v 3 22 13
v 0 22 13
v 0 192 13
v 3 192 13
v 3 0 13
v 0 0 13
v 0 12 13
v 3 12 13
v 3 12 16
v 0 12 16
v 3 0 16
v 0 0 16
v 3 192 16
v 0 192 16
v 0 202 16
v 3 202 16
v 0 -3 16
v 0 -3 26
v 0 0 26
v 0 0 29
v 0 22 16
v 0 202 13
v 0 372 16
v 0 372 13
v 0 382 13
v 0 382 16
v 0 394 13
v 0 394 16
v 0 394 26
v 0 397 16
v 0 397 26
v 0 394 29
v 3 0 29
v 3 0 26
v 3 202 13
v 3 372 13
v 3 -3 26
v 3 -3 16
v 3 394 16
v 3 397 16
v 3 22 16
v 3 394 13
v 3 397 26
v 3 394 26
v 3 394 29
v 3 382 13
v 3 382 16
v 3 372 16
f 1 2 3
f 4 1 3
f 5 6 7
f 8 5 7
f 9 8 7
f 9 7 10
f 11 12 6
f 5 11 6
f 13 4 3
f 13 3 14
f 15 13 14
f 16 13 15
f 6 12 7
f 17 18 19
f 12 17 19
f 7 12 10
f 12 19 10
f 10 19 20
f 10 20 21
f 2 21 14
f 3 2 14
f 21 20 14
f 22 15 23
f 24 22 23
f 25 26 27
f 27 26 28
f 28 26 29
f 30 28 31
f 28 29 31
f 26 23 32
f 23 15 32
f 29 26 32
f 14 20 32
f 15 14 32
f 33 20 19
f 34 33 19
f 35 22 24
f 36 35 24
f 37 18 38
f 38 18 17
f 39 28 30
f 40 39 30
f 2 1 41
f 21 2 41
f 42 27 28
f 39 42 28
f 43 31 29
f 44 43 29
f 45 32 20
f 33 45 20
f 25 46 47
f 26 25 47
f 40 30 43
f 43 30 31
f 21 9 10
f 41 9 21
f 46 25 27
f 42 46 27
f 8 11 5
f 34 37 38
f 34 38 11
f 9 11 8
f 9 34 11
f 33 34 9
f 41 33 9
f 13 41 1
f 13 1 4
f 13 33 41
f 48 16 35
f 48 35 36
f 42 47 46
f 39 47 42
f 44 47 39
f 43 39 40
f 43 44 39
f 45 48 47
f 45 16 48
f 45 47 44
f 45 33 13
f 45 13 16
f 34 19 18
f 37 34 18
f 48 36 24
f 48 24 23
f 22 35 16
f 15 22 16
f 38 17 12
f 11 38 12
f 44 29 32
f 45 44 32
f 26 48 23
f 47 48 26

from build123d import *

# Parameters (mm, degrees)
PAD003_DEPTH           = 3
SKETCH005_W            = 10
SKETCH005_H            = 3
POCKET001_DEPTH        = 3
LINEARPATTERN001_COUNT = 3
LINEARPATTERN001_PITCH = 180


with BuildPart() as part:
    # Sketch004 → Pad003 (new body)
    with BuildSketch(Plane.YZ):
        Polygon((394, 0), (0, 0), (0, -3), (-3, -3), (-3, -13), (0, -13), (0, -16), (394, -16), (394, -13), (397, -13), (397, -3), (394, -3), align=None)
    extrude(amount=PAD003_DEPTH)

    # Sketch005 → Pocket001 (cut)
    with BuildSketch(Plane.YZ.offset(3)):
        with Locations((17, -14.5)):
            Rectangle(SKETCH005_W, SKETCH005_H)
    pocket001 = extrude(amount=-POCKET001_DEPTH, mode=Mode.SUBTRACT)

    # LinearPattern001: Pocket001 ×3
    with Locations(*[(0, i * LINEARPATTERN001_PITCH, 0) for i in range(1, LINEARPATTERN001_COUNT)]):
        add(pocket001, mode=Mode.SUBTRACT)


with BuildPart() as part_1:
    # Body003 placement: moved
    add(part.part.moved(Location((0, 0, 29))))


solid = part_1.part
